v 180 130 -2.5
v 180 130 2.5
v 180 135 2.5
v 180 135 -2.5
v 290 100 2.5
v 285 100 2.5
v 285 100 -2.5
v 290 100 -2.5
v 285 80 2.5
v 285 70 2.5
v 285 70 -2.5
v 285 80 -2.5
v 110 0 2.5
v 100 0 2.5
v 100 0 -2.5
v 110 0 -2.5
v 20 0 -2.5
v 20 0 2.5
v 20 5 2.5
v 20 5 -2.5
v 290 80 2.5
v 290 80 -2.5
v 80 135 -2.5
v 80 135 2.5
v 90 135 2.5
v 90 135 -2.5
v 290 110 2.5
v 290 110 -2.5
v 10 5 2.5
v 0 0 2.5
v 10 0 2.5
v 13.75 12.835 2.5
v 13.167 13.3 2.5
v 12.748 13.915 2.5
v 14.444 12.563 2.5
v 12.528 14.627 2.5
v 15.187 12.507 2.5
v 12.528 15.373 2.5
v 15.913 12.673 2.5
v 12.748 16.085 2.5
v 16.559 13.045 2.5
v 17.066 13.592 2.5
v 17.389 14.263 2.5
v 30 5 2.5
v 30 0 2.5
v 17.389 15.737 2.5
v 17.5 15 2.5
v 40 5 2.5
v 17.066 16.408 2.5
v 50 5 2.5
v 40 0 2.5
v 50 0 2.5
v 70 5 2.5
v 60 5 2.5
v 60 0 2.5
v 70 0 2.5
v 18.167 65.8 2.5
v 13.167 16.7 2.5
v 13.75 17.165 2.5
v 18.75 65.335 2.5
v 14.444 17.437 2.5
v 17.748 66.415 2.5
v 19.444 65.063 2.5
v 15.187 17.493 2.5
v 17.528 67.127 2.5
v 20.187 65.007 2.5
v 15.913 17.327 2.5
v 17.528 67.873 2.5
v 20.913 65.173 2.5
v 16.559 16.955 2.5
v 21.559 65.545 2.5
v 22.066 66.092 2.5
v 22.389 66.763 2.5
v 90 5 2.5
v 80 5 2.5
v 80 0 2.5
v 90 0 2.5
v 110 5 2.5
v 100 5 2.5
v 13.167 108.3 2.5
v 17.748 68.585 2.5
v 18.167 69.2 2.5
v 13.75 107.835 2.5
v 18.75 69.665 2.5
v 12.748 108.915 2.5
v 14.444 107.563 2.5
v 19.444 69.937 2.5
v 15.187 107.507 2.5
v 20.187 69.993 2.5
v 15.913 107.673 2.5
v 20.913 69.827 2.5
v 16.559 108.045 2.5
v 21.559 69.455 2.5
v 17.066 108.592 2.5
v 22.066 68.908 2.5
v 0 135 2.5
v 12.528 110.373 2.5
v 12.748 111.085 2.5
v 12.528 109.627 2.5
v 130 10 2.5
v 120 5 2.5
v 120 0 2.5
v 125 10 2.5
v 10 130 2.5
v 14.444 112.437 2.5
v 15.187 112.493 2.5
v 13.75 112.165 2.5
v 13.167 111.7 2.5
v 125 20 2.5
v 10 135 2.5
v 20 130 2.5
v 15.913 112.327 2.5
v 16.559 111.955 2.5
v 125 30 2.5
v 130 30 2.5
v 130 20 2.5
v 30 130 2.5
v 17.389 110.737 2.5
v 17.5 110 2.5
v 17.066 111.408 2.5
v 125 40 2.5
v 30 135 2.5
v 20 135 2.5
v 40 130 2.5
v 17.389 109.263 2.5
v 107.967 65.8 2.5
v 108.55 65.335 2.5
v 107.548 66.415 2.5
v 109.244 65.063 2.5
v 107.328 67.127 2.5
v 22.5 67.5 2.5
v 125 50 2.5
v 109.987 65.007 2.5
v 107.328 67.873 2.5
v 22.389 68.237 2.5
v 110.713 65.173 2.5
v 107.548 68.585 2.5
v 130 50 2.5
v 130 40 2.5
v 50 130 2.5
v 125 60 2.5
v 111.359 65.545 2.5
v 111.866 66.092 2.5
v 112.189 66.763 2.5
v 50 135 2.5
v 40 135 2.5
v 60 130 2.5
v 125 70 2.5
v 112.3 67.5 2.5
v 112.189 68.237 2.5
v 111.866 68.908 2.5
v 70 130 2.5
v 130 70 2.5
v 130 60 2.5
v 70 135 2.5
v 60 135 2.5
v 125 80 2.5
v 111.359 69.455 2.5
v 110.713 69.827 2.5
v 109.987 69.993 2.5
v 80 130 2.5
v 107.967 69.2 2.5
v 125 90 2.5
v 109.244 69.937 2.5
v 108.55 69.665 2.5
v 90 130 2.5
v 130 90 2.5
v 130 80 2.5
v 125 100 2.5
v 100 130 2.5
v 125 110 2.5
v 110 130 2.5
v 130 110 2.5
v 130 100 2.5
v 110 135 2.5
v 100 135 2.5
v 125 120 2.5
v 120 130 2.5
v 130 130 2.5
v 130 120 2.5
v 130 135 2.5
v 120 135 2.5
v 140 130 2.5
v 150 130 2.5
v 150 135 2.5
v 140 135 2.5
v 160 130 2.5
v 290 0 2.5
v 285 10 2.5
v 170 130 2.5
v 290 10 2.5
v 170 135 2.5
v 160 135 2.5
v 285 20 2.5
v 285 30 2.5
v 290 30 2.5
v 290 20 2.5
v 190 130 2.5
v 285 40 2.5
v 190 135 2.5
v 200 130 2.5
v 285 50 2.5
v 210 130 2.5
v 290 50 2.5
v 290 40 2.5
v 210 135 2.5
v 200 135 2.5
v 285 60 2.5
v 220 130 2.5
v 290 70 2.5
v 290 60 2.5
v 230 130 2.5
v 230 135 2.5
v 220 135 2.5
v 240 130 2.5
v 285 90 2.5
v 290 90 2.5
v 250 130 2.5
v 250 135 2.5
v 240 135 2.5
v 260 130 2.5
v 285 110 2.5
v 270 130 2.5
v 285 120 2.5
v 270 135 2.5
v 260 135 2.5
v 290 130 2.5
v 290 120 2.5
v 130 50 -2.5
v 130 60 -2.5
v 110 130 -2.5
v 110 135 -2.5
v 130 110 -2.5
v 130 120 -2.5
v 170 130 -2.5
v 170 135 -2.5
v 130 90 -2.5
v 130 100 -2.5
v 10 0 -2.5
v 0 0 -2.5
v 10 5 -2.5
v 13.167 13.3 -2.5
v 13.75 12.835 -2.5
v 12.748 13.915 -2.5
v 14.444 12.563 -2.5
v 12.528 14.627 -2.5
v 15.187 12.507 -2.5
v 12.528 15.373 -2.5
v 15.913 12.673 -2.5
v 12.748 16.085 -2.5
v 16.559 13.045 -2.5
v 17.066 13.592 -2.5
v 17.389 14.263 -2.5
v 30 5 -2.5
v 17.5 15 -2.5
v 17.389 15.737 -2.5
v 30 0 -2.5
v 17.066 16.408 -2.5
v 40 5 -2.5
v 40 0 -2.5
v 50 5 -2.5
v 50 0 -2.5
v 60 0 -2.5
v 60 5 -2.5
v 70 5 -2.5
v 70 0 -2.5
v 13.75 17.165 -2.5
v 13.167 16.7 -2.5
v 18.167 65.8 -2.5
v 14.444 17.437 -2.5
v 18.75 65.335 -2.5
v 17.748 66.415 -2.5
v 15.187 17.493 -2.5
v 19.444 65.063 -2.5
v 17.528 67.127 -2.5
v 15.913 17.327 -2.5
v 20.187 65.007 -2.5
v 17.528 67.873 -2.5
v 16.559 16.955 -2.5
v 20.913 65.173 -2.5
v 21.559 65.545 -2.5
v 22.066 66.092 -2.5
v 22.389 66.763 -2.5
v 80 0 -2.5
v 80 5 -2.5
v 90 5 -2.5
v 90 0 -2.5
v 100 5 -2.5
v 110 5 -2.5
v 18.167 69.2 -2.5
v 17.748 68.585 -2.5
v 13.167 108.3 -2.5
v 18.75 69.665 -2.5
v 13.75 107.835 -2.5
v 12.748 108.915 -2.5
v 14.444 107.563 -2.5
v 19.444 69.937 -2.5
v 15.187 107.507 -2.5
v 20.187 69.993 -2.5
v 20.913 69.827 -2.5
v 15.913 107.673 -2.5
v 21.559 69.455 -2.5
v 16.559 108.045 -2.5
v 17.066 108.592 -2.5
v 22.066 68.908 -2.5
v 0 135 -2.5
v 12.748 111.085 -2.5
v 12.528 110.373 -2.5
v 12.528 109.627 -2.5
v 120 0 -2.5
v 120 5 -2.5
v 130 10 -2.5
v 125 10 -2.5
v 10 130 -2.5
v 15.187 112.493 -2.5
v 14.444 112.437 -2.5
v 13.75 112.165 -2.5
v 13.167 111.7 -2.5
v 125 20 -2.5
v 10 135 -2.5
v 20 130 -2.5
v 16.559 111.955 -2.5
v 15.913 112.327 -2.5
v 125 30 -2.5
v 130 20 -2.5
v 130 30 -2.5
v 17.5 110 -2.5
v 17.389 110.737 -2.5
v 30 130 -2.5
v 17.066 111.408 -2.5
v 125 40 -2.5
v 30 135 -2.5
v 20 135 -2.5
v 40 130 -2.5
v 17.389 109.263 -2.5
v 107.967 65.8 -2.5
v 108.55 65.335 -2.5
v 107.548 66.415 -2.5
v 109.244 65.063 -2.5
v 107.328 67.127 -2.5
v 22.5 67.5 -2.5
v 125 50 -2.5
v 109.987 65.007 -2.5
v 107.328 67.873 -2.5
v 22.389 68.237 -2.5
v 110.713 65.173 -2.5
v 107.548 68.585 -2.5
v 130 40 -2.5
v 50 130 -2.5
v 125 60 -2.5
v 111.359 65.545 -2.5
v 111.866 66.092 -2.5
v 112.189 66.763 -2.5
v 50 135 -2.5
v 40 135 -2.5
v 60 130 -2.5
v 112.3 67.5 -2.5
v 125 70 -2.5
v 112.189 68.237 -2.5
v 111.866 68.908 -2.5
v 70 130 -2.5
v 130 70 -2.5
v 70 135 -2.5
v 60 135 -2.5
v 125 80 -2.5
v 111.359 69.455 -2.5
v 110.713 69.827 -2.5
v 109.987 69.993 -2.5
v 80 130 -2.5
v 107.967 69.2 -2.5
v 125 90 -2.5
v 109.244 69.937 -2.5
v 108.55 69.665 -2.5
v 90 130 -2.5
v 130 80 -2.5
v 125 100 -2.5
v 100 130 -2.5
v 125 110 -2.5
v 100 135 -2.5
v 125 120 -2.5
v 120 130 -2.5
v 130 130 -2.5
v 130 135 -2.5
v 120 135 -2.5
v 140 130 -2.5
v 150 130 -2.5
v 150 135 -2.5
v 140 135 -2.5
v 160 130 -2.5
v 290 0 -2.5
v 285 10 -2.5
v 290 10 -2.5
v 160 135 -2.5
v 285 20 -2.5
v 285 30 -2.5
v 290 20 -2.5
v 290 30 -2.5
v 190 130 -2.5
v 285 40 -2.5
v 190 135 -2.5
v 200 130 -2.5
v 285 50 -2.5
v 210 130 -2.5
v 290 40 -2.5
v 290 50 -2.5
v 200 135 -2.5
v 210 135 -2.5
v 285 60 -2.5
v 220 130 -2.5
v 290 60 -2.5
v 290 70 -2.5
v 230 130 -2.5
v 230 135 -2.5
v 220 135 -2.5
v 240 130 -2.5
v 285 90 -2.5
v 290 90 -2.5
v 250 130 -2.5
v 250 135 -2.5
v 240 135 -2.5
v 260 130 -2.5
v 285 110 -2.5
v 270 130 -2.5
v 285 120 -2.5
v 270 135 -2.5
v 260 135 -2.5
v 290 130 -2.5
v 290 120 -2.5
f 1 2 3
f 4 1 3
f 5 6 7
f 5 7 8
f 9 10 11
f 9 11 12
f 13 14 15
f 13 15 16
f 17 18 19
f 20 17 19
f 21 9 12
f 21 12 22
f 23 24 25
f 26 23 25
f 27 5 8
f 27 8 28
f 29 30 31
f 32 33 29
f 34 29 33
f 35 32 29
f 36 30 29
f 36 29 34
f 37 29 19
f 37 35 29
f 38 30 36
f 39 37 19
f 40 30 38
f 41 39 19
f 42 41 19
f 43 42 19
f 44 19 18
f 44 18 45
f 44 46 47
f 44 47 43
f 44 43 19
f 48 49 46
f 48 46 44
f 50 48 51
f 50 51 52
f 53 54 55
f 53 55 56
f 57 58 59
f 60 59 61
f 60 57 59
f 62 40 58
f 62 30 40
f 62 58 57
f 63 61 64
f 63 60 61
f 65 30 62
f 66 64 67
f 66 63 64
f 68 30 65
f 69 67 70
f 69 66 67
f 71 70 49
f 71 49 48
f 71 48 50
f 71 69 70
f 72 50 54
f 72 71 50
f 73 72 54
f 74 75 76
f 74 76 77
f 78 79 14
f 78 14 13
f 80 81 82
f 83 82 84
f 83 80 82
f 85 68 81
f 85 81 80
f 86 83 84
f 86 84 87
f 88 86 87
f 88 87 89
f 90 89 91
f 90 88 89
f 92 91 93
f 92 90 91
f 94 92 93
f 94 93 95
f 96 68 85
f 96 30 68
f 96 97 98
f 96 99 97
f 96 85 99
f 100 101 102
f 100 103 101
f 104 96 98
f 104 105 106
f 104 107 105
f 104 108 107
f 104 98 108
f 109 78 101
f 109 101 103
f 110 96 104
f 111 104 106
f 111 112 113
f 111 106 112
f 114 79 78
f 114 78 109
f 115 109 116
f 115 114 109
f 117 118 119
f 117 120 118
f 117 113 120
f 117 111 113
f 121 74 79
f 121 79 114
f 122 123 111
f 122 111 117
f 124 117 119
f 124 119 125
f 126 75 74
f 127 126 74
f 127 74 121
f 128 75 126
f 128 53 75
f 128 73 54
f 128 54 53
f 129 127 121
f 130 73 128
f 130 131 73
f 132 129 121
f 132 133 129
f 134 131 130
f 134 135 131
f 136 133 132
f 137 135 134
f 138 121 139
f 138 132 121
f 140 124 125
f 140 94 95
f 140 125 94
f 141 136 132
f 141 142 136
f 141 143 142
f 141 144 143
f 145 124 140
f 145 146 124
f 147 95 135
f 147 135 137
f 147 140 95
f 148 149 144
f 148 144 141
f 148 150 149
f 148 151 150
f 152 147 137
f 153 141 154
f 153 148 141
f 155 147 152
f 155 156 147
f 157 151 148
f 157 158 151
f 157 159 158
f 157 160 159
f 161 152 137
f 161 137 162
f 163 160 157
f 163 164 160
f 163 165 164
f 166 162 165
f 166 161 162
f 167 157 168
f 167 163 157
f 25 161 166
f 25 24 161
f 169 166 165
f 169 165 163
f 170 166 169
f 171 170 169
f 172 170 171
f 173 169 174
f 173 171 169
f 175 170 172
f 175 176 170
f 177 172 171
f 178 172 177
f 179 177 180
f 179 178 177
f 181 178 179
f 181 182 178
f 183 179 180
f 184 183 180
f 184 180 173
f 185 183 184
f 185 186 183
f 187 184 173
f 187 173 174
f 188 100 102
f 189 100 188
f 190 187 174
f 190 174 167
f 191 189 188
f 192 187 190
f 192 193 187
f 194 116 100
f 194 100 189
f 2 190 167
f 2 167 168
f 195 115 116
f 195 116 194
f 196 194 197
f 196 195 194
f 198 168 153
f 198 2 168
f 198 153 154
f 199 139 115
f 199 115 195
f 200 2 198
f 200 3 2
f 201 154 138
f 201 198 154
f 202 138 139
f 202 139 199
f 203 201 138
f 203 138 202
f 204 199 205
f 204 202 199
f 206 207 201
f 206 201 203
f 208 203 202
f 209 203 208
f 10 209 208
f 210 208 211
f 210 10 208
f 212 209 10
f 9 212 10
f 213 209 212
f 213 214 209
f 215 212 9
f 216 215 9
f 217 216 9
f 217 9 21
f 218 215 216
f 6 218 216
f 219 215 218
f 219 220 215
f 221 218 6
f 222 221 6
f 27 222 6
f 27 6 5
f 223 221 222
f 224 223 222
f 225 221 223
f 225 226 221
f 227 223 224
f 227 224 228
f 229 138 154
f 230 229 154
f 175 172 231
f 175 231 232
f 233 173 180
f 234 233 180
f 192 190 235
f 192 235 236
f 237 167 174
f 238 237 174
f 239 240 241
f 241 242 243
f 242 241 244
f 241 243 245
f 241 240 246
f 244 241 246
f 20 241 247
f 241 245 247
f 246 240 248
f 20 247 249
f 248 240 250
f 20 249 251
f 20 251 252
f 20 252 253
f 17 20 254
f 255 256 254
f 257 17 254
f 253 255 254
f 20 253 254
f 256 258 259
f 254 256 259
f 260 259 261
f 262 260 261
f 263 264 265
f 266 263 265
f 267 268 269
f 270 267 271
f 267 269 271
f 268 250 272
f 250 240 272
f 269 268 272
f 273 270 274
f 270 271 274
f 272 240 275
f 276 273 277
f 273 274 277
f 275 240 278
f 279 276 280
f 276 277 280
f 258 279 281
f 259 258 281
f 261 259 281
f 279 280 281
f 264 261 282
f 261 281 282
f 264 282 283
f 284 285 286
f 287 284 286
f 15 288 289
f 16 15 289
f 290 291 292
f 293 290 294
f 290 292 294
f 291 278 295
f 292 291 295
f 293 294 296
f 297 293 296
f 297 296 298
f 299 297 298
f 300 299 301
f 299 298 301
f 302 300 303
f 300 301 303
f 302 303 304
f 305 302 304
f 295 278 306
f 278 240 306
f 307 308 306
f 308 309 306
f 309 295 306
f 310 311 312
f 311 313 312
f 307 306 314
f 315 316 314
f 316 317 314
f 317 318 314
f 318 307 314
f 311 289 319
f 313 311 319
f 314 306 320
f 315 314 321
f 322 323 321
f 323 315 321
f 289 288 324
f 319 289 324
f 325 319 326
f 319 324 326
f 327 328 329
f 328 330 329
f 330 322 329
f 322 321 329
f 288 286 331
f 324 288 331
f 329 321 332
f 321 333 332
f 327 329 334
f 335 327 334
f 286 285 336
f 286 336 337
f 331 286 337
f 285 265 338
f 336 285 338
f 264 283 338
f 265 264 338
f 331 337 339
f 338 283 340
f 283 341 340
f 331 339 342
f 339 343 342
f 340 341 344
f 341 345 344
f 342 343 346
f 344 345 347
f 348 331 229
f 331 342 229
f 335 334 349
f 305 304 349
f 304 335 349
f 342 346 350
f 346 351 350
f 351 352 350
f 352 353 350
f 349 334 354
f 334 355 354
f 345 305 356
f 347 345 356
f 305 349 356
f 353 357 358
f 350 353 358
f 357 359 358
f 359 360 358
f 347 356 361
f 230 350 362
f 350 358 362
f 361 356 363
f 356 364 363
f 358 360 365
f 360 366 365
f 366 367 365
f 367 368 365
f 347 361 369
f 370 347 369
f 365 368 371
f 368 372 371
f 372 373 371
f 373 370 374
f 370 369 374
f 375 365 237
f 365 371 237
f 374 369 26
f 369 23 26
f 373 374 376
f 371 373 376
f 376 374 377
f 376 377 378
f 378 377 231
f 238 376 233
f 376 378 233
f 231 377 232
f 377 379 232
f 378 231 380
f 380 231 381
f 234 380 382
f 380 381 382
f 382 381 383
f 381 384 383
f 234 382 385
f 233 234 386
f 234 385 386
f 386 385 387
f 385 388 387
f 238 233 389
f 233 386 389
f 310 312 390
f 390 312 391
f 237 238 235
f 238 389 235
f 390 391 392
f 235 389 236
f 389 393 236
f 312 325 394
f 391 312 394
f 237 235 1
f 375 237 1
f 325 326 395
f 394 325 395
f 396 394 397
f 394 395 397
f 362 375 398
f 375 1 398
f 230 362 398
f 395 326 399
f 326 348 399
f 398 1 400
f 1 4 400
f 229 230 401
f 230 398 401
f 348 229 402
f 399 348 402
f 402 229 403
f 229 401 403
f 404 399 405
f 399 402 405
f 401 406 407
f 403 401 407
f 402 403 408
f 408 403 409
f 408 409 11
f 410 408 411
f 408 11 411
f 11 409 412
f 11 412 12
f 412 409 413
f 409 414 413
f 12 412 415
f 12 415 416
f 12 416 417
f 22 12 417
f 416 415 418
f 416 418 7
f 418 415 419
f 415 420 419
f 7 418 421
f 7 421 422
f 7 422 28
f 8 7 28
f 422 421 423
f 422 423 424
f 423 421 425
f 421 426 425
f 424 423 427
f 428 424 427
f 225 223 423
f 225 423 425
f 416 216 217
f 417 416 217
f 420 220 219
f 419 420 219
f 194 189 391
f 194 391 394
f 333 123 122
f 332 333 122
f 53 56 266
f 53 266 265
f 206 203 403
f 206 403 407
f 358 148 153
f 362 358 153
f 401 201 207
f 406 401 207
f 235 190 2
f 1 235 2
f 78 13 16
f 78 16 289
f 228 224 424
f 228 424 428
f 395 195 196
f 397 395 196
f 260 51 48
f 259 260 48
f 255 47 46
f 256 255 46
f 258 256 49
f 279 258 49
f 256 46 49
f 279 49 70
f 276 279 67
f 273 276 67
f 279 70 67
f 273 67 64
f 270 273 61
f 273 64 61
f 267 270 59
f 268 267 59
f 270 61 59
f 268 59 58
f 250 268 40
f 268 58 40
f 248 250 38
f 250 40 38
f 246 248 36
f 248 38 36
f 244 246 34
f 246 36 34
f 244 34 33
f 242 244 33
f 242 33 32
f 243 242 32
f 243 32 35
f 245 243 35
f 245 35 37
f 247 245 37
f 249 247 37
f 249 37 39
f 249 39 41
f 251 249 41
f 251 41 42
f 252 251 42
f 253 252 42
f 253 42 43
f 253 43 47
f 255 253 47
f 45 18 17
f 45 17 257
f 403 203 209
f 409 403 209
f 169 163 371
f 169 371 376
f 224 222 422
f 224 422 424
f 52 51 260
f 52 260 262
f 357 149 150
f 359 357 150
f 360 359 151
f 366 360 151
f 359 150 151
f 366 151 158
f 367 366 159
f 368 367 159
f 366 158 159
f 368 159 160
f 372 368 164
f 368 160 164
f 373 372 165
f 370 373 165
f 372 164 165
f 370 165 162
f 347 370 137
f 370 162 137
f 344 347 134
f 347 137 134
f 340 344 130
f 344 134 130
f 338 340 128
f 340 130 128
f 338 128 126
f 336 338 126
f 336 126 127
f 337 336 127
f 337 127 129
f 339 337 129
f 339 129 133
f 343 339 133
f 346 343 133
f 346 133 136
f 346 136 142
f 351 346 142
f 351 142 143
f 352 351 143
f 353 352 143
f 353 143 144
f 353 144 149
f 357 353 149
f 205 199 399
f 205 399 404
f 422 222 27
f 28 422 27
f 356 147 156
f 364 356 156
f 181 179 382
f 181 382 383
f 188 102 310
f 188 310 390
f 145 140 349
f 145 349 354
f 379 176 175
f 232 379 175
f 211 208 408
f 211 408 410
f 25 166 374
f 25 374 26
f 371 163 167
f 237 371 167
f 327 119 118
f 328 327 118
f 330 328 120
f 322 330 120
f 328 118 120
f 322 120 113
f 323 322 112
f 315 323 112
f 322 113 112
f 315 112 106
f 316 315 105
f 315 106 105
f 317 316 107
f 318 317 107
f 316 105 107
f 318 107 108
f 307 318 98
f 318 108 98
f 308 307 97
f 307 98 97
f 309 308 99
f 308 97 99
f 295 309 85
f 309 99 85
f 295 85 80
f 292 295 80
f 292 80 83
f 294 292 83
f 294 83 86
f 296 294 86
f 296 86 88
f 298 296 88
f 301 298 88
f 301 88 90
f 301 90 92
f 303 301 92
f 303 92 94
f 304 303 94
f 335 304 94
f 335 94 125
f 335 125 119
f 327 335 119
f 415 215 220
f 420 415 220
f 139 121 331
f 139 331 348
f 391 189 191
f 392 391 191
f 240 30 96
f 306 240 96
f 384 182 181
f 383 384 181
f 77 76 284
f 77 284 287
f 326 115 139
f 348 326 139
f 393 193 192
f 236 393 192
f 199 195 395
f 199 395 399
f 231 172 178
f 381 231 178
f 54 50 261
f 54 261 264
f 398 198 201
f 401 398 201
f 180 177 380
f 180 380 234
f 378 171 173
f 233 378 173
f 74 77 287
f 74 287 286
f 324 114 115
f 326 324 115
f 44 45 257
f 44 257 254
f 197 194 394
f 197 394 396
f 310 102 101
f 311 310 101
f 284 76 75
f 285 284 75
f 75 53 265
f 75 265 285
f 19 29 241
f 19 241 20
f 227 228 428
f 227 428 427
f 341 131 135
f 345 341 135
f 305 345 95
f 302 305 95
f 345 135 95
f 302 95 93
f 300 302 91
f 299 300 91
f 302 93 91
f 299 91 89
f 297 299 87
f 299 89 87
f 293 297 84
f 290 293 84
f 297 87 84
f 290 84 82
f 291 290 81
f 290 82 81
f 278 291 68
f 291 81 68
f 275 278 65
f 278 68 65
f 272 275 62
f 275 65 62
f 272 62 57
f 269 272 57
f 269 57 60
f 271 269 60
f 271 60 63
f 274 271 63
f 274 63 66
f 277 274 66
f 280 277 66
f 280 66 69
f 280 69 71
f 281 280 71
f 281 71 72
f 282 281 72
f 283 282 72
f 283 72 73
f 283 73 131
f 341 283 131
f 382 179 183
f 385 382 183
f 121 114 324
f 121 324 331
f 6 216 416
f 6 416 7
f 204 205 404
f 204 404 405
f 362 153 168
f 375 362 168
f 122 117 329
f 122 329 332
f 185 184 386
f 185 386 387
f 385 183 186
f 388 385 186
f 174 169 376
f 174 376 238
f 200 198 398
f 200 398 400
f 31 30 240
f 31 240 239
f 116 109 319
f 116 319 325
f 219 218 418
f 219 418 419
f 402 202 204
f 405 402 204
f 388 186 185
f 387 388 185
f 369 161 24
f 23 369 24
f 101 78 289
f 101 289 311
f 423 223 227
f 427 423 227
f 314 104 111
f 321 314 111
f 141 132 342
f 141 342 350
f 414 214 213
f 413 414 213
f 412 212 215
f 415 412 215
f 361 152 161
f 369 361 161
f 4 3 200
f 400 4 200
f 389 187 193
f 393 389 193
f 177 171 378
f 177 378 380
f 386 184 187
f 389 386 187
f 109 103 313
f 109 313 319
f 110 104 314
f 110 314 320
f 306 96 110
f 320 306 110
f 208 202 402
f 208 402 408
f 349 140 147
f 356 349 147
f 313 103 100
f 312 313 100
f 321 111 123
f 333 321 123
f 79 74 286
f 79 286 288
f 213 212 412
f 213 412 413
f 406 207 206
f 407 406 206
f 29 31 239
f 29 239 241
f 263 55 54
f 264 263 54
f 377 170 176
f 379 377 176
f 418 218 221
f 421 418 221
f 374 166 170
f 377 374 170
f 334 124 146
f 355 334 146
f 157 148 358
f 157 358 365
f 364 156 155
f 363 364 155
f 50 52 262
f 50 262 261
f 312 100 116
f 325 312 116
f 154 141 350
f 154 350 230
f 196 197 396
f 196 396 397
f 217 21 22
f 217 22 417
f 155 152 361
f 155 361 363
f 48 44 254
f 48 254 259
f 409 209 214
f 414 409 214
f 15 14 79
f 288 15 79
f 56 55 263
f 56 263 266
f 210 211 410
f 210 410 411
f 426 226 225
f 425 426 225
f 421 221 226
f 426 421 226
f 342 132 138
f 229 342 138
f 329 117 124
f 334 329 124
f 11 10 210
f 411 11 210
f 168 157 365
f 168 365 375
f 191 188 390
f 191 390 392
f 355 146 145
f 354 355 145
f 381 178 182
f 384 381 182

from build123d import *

# Parameters (mm, degrees)
SKETCH_W        = 290
SKETCH_H        = 130
PAD_DEPTH       = 2.5
SKETCH001_R     = 2.5
POCKET_DEPTH    = 5.001
SKETCH002_W     = 5
SKETCH002_H     = 10
POCKET001_DEPTH = 5.001
SKETCH003_W     = 10
SKETCH003_H     = 5
PAD001_DEPTH    = 5
SKETCH004_W     = 10
SKETCH004_H     = 5
POCKET002_DEPTH = 5.001
SKETCH005_W     = 5
SKETCH005_H     = 10
POCKET003_DEPTH = 5.001
SKETCH006_R     = 2.5
POCKET004_DEPTH = 5.001


with BuildPart() as part:
    # Sketch → Pad (new body, symmetric)
    with BuildSketch(Plane.XY):
        with Locations((145, 65)):
            Rectangle(SKETCH_W, SKETCH_H)
    extrude(amount=PAD_DEPTH, both=True)

    # Sketch001 (on Face6 of Pad) → Pocket (cut, through all)
    with BuildSketch(Plane.XY.offset(2.5)):
        with Locations((15, 110)):
            Circle(SKETCH001_R)
        with Locations((15, 15)):
            Circle(SKETCH001_R)
    extrude(amount=-POCKET_DEPTH, mode=Mode.SUBTRACT)

    # Sketch002 (on Face5 of Pocket) → Pocket001 (cut, through all)
    with BuildSketch(Plane.XY.offset(2.5)):
        with Locations((287.5, 15)):
            Rectangle(SKETCH002_W, SKETCH002_H)
        with Locations((287.5, 35)):
            Rectangle(SKETCH002_W, SKETCH002_H)
        with Locations((287.5, 55)):
            Rectangle(SKETCH002_W, SKETCH002_H)
        with Locations((287.5, 75)):
            Rectangle(SKETCH002_W, SKETCH002_H)
        with Locations((287.5, 95)):
            Rectangle(SKETCH002_W, SKETCH002_H)
        with Locations((287.5, 115)):
            Rectangle(SKETCH002_W, SKETCH002_H)
    extrude(amount=-POCKET001_DEPTH, mode=Mode.SUBTRACT)

    # Sketch003 (on Face5 of Pocket001) → Pad001 (join)
    with BuildSketch(Plane.XY.offset(2.5)):
        with Locations((5, 132.5)):
            Rectangle(SKETCH003_W, SKETCH003_H)
        with Locations((25, 132.5)):
            Rectangle(SKETCH003_W, SKETCH003_H)
        with Locations((45, 132.5)):
            Rectangle(SKETCH003_W, SKETCH003_H)
        with Locations((65, 132.5)):
            Rectangle(SKETCH003_W, SKETCH003_H)
        with Locations((85, 132.5)):
            Rectangle(SKETCH003_W, SKETCH003_H)
        with Locations((105, 132.5)):
            Rectangle(SKETCH003_W, SKETCH003_H)
        with Locations((125, 132.5)):
            Rectangle(SKETCH003_W, SKETCH003_H)
        with Locations((145, 132.5)):
            Rectangle(SKETCH003_W, SKETCH003_H)
        with Locations((165, 132.5)):
            Rectangle(SKETCH003_W, SKETCH003_H)
        with Locations((185, 132.5)):
            Rectangle(SKETCH003_W, SKETCH003_H)
        with Locations((205, 132.5)):
            Rectangle(SKETCH003_W, SKETCH003_H)
        with Locations((225, 132.5)):
            Rectangle(SKETCH003_W, SKETCH003_H)
        with Locations((245, 132.5)):
            Rectangle(SKETCH003_W, SKETCH003_H)
        with Locations((265, 132.5)):
            Rectangle(SKETCH003_W, SKETCH003_H)
    extrude(amount=-PAD001_DEPTH)

    # Sketch004 (on Face86 of Pad001) → Pocket002 (cut, through all)
    with BuildSketch(Plane.XY.offset(2.5)):
        with Locations((15, 2.5)):
            Rectangle(SKETCH004_W, SKETCH004_H)
        with Locations((35, 2.5)):
            Rectangle(SKETCH004_W, SKETCH004_H)
        with Locations((55, 2.5)):
            Rectangle(SKETCH004_W, SKETCH004_H)
        with Locations((75, 2.5)):
            Rectangle(SKETCH004_W, SKETCH004_H)
        with Locations((95, 2.5)):
            Rectangle(SKETCH004_W, SKETCH004_H)
        with Locations((115, 2.5)):
            Rectangle(SKETCH004_W, SKETCH004_H)
    extrude(amount=-POCKET002_DEPTH, mode=Mode.SUBTRACT)

    # Sketch005 (on Face4 of Pocket002) → Pocket003 (cut, through all)
    with BuildSketch(Plane.XY.offset(2.5)):
        with Locations((127.5, 15)):
            Rectangle(SKETCH005_W, SKETCH005_H)
        with Locations((127.5, 35)):
            Rectangle(SKETCH005_W, SKETCH005_H)
        with Locations((127.5, 55)):
            Rectangle(SKETCH005_W, SKETCH005_H)
        with Locations((127.5, 75)):
            Rectangle(SKETCH005_W, SKETCH005_H)
        with Locations((127.5, 95)):
            Rectangle(SKETCH005_W, SKETCH005_H)
        with Locations((127.5, 115)):
            Rectangle(SKETCH005_W, SKETCH005_H)
    extrude(amount=-POCKET003_DEPTH, mode=Mode.SUBTRACT)

    # Sketch006 (on Face4 of Pocket003) → Pocket004 (cut, through all)
    with BuildSketch(Plane.XY.offset(2.5)):
        with Locations((20, 67.5)):
            Circle(SKETCH006_R)
        with Locations((109.8, 67.5)):
            Circle(SKETCH006_R)
    extrude(amount=-POCKET004_DEPTH, mode=Mode.SUBTRACT)


solid = part.part
